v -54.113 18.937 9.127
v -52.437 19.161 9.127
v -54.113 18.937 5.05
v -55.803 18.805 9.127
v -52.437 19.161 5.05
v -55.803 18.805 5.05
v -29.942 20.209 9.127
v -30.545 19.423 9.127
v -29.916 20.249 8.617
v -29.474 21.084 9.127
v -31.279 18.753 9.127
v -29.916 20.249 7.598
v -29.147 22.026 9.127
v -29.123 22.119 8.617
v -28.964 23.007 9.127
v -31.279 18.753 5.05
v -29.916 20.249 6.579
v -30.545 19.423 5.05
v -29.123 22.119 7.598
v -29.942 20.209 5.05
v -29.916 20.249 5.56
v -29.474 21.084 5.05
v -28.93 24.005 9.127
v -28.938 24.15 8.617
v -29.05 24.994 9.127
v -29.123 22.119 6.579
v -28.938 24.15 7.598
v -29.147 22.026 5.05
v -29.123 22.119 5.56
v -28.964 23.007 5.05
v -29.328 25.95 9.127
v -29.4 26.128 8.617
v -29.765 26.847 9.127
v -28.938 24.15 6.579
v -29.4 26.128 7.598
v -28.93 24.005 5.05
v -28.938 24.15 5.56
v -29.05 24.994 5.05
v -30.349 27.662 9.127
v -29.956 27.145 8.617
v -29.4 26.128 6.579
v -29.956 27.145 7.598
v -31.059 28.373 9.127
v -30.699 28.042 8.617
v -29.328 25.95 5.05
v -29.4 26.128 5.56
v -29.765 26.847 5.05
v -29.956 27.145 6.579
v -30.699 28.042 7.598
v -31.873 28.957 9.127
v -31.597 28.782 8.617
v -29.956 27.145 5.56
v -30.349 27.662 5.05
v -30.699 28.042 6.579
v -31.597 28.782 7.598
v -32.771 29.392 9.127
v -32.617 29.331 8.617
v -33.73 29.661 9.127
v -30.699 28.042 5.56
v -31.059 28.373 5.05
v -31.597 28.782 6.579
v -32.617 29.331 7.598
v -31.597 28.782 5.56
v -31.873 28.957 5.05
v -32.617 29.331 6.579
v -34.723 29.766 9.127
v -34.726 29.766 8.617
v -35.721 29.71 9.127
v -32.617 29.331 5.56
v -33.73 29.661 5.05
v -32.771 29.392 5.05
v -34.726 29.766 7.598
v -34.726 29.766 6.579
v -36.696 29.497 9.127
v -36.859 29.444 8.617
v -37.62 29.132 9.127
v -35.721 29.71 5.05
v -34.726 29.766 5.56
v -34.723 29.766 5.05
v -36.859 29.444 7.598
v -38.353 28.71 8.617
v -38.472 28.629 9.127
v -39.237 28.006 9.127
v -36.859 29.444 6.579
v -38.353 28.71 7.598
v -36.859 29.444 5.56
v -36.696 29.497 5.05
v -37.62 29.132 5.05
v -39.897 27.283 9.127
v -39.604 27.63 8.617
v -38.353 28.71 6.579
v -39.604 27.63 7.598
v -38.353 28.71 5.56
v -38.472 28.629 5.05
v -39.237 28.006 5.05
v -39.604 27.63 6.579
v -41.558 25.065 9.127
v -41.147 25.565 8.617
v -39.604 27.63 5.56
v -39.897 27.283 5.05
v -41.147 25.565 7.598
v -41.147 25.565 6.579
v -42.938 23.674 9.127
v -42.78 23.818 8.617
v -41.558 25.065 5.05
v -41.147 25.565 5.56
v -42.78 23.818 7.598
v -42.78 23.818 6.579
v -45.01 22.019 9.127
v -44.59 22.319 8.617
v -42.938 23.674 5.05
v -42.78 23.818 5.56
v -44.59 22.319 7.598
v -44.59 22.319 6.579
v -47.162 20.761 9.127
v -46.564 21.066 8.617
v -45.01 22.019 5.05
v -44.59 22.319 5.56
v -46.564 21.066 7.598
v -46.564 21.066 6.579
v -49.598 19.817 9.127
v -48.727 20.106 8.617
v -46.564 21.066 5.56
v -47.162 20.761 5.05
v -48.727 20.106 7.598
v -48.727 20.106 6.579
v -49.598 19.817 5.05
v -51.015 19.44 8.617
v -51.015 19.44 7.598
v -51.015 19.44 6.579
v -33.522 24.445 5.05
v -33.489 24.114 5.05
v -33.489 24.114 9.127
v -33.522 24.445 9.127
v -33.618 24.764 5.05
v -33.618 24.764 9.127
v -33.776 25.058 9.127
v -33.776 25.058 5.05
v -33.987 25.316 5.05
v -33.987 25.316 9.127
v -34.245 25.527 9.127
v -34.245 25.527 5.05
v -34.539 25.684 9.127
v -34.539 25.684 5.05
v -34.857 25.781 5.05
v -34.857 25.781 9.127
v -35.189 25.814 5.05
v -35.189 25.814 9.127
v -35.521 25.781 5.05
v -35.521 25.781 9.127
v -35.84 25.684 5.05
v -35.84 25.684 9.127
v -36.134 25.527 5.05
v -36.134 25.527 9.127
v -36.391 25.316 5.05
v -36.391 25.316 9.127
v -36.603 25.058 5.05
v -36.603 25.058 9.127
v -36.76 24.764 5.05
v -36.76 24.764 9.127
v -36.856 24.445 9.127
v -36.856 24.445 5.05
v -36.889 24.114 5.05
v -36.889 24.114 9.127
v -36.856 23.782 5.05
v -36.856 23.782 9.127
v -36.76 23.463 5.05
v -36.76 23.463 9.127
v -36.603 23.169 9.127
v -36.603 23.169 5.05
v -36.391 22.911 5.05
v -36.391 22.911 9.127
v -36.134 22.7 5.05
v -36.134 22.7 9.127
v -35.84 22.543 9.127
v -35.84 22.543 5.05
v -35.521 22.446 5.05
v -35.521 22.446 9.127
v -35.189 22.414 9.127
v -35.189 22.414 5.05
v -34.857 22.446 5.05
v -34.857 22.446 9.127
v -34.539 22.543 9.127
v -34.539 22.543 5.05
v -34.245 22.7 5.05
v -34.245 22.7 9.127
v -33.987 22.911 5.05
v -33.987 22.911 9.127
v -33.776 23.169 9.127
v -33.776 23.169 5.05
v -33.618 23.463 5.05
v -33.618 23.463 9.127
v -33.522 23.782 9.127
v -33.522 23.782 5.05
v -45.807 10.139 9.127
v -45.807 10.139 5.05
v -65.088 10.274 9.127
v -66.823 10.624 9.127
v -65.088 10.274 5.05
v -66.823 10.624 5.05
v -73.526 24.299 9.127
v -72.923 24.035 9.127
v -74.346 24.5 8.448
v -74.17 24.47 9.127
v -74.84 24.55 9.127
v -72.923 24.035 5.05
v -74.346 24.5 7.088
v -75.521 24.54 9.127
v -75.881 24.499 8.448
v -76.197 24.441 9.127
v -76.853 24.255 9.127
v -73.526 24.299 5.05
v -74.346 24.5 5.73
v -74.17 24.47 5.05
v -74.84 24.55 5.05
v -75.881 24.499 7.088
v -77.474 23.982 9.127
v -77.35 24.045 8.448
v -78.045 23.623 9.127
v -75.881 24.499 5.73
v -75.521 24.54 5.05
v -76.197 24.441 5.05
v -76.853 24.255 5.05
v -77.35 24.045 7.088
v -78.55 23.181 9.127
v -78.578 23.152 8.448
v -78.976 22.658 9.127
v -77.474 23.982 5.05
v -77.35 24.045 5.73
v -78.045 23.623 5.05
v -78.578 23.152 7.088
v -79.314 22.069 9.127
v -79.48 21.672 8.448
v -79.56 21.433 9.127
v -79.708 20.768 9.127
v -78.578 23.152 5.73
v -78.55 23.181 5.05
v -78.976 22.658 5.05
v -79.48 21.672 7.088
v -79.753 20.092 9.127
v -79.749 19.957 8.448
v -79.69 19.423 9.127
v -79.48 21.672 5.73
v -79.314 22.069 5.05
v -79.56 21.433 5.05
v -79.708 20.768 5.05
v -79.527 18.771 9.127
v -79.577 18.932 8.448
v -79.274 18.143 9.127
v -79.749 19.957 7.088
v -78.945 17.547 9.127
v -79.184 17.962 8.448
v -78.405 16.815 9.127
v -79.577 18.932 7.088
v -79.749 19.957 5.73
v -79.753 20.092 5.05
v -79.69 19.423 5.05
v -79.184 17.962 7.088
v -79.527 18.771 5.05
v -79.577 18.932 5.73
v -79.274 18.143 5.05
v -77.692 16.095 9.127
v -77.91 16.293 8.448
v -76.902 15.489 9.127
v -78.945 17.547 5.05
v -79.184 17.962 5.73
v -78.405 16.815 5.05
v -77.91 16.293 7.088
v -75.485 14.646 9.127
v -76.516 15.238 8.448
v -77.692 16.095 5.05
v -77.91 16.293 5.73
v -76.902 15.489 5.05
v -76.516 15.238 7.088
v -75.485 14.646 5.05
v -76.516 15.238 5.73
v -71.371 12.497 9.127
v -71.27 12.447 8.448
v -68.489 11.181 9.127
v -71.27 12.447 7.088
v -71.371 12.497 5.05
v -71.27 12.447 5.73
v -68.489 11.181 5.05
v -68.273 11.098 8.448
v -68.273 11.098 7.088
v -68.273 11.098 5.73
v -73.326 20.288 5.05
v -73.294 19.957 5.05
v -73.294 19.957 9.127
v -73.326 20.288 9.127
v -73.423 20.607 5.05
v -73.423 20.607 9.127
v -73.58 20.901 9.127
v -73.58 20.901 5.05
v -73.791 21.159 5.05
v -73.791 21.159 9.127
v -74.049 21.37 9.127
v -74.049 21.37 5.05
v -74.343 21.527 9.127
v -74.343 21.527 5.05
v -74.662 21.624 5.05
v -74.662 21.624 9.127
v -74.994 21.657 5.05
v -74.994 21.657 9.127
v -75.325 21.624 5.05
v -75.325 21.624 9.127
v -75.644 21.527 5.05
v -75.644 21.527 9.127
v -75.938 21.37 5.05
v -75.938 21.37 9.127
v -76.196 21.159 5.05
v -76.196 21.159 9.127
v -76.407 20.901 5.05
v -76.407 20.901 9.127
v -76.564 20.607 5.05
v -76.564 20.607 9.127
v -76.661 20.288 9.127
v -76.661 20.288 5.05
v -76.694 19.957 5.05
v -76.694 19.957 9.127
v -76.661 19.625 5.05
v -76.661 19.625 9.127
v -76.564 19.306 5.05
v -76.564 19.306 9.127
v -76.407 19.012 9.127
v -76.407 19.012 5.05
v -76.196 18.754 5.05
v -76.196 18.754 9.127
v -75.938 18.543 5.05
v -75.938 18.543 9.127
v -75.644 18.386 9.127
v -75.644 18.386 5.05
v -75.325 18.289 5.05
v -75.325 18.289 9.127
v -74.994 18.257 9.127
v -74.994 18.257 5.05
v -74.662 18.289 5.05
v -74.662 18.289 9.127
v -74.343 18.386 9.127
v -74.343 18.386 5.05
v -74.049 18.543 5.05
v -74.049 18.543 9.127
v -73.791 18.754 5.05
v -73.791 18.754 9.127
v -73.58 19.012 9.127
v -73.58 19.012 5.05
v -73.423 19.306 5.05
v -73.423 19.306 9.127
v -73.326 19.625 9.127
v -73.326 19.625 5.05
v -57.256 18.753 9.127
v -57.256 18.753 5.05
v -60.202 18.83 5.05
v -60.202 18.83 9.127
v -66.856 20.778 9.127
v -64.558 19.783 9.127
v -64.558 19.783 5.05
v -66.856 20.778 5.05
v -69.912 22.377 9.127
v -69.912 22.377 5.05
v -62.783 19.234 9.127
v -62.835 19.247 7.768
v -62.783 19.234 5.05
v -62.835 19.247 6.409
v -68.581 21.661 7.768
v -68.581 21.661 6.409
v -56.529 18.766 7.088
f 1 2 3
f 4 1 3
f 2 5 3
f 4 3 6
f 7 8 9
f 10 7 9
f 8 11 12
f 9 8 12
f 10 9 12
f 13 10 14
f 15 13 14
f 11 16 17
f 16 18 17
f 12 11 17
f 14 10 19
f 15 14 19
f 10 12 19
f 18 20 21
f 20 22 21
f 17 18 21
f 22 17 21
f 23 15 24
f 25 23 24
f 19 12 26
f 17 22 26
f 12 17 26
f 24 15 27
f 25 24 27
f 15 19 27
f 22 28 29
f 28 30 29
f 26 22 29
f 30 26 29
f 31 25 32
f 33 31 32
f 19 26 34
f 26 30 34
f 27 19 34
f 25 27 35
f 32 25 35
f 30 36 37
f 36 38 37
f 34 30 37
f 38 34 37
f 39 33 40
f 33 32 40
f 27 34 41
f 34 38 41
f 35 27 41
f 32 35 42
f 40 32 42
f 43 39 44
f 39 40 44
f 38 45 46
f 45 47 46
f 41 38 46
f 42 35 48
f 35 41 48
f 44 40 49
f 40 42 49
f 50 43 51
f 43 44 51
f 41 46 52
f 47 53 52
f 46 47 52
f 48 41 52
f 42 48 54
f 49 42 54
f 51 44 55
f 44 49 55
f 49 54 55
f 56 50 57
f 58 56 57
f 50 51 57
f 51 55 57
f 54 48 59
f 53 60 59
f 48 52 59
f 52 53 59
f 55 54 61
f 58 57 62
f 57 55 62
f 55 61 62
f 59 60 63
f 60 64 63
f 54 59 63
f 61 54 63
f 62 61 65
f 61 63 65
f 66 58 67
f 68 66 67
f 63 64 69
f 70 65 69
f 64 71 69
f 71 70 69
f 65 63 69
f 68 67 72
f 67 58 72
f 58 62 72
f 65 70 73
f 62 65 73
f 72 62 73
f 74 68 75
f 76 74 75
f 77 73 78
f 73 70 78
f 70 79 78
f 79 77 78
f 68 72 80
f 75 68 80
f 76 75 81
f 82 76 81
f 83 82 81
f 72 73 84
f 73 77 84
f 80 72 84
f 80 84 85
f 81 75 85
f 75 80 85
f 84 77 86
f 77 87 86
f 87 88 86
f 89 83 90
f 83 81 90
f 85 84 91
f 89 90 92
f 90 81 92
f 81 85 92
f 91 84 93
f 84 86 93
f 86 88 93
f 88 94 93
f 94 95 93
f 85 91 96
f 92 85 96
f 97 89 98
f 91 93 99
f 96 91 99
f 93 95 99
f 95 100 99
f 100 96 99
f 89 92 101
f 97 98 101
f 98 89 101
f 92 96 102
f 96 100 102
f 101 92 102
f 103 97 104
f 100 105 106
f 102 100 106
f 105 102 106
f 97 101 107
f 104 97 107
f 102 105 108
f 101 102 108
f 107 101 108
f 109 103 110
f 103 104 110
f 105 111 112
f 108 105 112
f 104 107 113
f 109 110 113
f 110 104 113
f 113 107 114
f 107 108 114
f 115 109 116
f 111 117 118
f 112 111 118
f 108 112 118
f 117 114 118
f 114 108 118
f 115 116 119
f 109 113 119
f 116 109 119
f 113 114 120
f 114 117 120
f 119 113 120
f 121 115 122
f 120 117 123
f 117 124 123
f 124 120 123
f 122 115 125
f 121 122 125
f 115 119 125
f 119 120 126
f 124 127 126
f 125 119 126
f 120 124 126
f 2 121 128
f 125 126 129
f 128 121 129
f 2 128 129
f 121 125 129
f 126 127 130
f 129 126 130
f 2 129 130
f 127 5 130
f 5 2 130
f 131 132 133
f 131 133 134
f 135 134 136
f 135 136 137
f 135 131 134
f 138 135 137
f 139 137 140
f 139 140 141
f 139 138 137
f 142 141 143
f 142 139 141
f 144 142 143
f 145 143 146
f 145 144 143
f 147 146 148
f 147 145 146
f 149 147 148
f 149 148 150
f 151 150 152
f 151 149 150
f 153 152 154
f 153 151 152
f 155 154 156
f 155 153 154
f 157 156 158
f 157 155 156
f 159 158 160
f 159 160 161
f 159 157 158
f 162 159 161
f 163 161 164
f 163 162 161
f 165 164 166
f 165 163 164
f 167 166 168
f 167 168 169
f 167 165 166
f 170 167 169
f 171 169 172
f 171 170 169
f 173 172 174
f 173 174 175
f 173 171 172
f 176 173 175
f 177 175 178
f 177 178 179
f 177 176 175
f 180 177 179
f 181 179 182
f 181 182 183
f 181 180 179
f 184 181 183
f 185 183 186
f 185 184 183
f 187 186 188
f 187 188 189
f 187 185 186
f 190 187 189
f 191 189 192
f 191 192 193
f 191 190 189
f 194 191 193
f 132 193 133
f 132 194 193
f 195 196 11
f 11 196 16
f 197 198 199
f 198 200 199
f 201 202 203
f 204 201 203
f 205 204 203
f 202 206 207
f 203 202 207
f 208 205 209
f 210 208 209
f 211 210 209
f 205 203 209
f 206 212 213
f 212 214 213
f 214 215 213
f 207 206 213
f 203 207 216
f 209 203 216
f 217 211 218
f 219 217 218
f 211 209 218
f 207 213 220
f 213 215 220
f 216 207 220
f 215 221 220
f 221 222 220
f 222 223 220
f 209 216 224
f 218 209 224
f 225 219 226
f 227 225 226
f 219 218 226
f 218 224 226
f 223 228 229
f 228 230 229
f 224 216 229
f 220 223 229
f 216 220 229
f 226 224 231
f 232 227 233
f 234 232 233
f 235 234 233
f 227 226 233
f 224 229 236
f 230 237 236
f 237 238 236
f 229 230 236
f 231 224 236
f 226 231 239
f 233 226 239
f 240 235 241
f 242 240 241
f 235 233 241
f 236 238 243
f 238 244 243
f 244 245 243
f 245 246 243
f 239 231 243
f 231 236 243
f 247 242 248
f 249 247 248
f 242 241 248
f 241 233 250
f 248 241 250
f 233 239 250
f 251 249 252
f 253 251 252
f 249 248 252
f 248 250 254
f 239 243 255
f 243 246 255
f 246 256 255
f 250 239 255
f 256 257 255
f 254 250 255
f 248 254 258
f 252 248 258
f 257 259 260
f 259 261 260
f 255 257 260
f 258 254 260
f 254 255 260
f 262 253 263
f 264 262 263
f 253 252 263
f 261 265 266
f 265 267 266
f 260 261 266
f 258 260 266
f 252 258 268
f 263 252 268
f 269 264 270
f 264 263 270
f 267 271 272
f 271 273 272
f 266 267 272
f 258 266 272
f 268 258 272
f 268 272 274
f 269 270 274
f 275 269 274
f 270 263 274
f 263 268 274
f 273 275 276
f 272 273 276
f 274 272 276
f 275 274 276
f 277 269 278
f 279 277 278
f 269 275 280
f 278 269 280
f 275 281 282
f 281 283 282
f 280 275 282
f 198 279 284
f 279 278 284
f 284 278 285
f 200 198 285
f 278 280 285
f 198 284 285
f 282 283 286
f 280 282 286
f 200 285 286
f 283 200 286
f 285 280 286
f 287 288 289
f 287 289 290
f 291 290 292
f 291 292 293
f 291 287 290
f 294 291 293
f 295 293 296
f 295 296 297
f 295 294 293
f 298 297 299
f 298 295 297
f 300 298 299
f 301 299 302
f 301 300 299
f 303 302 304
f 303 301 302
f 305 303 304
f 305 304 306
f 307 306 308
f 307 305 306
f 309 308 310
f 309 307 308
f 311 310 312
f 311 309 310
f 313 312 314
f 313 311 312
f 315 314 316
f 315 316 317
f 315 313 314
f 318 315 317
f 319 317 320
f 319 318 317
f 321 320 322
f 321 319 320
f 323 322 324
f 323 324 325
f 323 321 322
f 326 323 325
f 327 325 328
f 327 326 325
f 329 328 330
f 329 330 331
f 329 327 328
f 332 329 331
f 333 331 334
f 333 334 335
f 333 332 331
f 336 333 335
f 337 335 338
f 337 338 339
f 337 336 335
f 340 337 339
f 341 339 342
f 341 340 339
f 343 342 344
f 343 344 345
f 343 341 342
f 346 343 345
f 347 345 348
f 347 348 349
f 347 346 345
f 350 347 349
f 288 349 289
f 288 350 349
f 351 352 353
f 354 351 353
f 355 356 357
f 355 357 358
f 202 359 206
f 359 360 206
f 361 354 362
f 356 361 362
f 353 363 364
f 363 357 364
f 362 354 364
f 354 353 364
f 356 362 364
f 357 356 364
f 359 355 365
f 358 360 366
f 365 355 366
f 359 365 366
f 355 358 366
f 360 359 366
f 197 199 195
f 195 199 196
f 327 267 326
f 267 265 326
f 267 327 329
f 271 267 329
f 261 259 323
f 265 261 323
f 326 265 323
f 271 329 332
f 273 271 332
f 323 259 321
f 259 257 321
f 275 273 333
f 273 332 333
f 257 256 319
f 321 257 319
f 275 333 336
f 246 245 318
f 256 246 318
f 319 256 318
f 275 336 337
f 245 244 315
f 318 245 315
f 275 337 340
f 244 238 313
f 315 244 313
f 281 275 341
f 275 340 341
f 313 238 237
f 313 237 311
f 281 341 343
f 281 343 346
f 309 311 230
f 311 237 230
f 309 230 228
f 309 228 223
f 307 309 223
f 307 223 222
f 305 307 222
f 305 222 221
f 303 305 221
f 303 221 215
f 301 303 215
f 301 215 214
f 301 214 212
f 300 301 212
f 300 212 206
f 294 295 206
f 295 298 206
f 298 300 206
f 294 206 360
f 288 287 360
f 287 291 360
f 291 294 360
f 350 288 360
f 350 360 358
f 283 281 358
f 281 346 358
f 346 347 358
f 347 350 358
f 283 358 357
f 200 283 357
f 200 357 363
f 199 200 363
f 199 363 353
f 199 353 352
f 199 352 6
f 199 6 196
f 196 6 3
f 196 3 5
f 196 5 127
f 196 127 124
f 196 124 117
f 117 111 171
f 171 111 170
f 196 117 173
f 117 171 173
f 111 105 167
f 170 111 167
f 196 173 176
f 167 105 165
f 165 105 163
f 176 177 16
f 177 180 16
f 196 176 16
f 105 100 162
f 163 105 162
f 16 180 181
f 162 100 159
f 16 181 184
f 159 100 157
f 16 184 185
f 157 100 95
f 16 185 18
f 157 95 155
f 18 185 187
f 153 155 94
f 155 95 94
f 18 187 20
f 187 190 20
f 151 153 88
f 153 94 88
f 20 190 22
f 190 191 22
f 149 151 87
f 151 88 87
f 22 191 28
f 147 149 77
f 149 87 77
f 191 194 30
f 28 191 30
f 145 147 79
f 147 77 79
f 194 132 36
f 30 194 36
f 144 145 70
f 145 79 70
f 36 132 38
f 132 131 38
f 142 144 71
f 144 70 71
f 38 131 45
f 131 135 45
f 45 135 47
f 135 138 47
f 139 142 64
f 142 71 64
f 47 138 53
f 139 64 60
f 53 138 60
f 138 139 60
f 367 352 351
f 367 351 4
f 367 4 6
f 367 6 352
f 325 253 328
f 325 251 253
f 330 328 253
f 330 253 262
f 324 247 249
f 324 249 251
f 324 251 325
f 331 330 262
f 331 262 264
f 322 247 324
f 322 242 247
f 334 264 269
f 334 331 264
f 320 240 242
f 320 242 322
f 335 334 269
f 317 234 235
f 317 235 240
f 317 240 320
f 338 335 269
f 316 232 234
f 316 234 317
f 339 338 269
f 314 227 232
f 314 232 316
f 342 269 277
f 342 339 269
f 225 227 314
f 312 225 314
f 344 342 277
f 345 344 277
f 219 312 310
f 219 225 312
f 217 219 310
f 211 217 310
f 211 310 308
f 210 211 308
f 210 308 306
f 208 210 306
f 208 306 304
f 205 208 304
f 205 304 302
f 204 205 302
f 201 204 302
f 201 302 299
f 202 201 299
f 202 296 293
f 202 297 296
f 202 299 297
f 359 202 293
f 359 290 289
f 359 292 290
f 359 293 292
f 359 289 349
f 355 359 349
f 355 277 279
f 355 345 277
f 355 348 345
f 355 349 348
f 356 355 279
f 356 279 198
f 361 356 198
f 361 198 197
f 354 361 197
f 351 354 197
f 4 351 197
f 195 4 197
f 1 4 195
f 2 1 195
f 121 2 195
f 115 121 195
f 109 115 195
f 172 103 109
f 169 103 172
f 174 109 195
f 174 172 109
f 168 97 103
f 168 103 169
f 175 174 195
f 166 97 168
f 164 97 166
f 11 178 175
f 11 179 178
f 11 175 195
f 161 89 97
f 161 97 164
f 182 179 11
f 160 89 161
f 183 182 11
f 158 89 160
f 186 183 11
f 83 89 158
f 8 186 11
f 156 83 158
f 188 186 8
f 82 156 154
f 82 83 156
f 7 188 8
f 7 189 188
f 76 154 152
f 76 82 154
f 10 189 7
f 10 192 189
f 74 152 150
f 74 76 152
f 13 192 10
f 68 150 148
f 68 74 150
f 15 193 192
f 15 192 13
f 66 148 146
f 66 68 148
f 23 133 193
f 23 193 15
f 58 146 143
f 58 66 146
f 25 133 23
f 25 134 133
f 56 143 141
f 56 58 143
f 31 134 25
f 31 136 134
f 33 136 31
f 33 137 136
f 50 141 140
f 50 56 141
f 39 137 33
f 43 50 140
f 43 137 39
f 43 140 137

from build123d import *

# Parameters (mm, degrees)
SCHIZZO1_R                   = 1.7
ESTRUSIONE_ESTRUSIONE1_DEPTH = 4.077


with BuildPart() as part:
    # Schizzo1 → Estrusione-Estrusione1 (new body)
    with BuildSketch(Plane.XY.offset(5.05)):
        with BuildLine():
            Line((-65.088157236, 10.27368012), (-45.806517375, 10.138527109))
            Line((-45.806517375, 10.138527109), (-31.279343931, 18.753125585))
            add(Edge.make_bspline(
                [(-31.279343931, 18.753125585), (-29.098043345, 20.403651058), (-27.905057256, 25.441624833), (-32.300384053, 29.85841163), (-36.690541673, 29.918863446), (-39.614892883, 27.942376602), (-41.03245157, 25.552100431), (-43.284640457, 23.241638673), (-47.763557065, 19.862154048), (-52.57074608, 18.979169365), (-55.803154975, 18.8049533)],
                knots=[0, 0, 0, 0, 0.102244465, 0.160154236, 0.214292787, 0.256272844, 0.289149591, 0.319658417, 0.379342086, 0.500706378, 0.500706378, 0.500706378, 0.500706378], degree=3))
            add(Edge.make_bspline(
                [(-57.25626525, 18.753125585), (-56.52869344, 18.753125585), (-55.803154975, 18.8049533)],
                knots=[4.71238898, 4.71238898, 4.71238898, 4.787168695, 4.787168695, 4.787168695], degree=2, weights=[1, 0.999301081, 1]))
            add(Edge.make_bspline(
                [(-57.25626525, 18.753125585), (-59.155150134, 18.717879159), (-63.127762505, 18.895973961), (-68.251383716, 21.432820435), (-71.466164586, 23.233839924), (-72.923411034, 24.034523908)],
                knots=[0.518902231, 0.518902231, 0.518902231, 0.518902231, 0.590344576, 0.669858142, 0.733003007, 0.733003007, 0.733003007, 0.733003007], degree=3))
            add(Edge.make_bspline(
                [(-72.923411034, 24.034523908), (-74.666838591, 24.972814401), (-78.608984565, 24.433280608), (-80.322463607, 19.660976663), (-78.265100941, 16.127751093), (-74.780476619, 14.267051221), (-70.589814259, 12.049912577), (-67.299822618, 10.554068254), (-65.088157236, 10.27368012)],
                knots=[0, 0, 0, 0, 0.216025249, 0.338628166, 0.486312744, 0.611906589, 0.763100731, 1, 1, 1, 1], degree=3))
        make_face()
        with Locations((-74.993560801, 19.956508848)):
            Circle(SCHIZZO1_R, mode=Mode.SUBTRACT)
        with Locations((-35.18906777, 24.113568479)):
            Circle(SCHIZZO1_R, mode=Mode.SUBTRACT)
    extrude(amount=ESTRUSIONE_ESTRUSIONE1_DEPTH)


solid = part.part
